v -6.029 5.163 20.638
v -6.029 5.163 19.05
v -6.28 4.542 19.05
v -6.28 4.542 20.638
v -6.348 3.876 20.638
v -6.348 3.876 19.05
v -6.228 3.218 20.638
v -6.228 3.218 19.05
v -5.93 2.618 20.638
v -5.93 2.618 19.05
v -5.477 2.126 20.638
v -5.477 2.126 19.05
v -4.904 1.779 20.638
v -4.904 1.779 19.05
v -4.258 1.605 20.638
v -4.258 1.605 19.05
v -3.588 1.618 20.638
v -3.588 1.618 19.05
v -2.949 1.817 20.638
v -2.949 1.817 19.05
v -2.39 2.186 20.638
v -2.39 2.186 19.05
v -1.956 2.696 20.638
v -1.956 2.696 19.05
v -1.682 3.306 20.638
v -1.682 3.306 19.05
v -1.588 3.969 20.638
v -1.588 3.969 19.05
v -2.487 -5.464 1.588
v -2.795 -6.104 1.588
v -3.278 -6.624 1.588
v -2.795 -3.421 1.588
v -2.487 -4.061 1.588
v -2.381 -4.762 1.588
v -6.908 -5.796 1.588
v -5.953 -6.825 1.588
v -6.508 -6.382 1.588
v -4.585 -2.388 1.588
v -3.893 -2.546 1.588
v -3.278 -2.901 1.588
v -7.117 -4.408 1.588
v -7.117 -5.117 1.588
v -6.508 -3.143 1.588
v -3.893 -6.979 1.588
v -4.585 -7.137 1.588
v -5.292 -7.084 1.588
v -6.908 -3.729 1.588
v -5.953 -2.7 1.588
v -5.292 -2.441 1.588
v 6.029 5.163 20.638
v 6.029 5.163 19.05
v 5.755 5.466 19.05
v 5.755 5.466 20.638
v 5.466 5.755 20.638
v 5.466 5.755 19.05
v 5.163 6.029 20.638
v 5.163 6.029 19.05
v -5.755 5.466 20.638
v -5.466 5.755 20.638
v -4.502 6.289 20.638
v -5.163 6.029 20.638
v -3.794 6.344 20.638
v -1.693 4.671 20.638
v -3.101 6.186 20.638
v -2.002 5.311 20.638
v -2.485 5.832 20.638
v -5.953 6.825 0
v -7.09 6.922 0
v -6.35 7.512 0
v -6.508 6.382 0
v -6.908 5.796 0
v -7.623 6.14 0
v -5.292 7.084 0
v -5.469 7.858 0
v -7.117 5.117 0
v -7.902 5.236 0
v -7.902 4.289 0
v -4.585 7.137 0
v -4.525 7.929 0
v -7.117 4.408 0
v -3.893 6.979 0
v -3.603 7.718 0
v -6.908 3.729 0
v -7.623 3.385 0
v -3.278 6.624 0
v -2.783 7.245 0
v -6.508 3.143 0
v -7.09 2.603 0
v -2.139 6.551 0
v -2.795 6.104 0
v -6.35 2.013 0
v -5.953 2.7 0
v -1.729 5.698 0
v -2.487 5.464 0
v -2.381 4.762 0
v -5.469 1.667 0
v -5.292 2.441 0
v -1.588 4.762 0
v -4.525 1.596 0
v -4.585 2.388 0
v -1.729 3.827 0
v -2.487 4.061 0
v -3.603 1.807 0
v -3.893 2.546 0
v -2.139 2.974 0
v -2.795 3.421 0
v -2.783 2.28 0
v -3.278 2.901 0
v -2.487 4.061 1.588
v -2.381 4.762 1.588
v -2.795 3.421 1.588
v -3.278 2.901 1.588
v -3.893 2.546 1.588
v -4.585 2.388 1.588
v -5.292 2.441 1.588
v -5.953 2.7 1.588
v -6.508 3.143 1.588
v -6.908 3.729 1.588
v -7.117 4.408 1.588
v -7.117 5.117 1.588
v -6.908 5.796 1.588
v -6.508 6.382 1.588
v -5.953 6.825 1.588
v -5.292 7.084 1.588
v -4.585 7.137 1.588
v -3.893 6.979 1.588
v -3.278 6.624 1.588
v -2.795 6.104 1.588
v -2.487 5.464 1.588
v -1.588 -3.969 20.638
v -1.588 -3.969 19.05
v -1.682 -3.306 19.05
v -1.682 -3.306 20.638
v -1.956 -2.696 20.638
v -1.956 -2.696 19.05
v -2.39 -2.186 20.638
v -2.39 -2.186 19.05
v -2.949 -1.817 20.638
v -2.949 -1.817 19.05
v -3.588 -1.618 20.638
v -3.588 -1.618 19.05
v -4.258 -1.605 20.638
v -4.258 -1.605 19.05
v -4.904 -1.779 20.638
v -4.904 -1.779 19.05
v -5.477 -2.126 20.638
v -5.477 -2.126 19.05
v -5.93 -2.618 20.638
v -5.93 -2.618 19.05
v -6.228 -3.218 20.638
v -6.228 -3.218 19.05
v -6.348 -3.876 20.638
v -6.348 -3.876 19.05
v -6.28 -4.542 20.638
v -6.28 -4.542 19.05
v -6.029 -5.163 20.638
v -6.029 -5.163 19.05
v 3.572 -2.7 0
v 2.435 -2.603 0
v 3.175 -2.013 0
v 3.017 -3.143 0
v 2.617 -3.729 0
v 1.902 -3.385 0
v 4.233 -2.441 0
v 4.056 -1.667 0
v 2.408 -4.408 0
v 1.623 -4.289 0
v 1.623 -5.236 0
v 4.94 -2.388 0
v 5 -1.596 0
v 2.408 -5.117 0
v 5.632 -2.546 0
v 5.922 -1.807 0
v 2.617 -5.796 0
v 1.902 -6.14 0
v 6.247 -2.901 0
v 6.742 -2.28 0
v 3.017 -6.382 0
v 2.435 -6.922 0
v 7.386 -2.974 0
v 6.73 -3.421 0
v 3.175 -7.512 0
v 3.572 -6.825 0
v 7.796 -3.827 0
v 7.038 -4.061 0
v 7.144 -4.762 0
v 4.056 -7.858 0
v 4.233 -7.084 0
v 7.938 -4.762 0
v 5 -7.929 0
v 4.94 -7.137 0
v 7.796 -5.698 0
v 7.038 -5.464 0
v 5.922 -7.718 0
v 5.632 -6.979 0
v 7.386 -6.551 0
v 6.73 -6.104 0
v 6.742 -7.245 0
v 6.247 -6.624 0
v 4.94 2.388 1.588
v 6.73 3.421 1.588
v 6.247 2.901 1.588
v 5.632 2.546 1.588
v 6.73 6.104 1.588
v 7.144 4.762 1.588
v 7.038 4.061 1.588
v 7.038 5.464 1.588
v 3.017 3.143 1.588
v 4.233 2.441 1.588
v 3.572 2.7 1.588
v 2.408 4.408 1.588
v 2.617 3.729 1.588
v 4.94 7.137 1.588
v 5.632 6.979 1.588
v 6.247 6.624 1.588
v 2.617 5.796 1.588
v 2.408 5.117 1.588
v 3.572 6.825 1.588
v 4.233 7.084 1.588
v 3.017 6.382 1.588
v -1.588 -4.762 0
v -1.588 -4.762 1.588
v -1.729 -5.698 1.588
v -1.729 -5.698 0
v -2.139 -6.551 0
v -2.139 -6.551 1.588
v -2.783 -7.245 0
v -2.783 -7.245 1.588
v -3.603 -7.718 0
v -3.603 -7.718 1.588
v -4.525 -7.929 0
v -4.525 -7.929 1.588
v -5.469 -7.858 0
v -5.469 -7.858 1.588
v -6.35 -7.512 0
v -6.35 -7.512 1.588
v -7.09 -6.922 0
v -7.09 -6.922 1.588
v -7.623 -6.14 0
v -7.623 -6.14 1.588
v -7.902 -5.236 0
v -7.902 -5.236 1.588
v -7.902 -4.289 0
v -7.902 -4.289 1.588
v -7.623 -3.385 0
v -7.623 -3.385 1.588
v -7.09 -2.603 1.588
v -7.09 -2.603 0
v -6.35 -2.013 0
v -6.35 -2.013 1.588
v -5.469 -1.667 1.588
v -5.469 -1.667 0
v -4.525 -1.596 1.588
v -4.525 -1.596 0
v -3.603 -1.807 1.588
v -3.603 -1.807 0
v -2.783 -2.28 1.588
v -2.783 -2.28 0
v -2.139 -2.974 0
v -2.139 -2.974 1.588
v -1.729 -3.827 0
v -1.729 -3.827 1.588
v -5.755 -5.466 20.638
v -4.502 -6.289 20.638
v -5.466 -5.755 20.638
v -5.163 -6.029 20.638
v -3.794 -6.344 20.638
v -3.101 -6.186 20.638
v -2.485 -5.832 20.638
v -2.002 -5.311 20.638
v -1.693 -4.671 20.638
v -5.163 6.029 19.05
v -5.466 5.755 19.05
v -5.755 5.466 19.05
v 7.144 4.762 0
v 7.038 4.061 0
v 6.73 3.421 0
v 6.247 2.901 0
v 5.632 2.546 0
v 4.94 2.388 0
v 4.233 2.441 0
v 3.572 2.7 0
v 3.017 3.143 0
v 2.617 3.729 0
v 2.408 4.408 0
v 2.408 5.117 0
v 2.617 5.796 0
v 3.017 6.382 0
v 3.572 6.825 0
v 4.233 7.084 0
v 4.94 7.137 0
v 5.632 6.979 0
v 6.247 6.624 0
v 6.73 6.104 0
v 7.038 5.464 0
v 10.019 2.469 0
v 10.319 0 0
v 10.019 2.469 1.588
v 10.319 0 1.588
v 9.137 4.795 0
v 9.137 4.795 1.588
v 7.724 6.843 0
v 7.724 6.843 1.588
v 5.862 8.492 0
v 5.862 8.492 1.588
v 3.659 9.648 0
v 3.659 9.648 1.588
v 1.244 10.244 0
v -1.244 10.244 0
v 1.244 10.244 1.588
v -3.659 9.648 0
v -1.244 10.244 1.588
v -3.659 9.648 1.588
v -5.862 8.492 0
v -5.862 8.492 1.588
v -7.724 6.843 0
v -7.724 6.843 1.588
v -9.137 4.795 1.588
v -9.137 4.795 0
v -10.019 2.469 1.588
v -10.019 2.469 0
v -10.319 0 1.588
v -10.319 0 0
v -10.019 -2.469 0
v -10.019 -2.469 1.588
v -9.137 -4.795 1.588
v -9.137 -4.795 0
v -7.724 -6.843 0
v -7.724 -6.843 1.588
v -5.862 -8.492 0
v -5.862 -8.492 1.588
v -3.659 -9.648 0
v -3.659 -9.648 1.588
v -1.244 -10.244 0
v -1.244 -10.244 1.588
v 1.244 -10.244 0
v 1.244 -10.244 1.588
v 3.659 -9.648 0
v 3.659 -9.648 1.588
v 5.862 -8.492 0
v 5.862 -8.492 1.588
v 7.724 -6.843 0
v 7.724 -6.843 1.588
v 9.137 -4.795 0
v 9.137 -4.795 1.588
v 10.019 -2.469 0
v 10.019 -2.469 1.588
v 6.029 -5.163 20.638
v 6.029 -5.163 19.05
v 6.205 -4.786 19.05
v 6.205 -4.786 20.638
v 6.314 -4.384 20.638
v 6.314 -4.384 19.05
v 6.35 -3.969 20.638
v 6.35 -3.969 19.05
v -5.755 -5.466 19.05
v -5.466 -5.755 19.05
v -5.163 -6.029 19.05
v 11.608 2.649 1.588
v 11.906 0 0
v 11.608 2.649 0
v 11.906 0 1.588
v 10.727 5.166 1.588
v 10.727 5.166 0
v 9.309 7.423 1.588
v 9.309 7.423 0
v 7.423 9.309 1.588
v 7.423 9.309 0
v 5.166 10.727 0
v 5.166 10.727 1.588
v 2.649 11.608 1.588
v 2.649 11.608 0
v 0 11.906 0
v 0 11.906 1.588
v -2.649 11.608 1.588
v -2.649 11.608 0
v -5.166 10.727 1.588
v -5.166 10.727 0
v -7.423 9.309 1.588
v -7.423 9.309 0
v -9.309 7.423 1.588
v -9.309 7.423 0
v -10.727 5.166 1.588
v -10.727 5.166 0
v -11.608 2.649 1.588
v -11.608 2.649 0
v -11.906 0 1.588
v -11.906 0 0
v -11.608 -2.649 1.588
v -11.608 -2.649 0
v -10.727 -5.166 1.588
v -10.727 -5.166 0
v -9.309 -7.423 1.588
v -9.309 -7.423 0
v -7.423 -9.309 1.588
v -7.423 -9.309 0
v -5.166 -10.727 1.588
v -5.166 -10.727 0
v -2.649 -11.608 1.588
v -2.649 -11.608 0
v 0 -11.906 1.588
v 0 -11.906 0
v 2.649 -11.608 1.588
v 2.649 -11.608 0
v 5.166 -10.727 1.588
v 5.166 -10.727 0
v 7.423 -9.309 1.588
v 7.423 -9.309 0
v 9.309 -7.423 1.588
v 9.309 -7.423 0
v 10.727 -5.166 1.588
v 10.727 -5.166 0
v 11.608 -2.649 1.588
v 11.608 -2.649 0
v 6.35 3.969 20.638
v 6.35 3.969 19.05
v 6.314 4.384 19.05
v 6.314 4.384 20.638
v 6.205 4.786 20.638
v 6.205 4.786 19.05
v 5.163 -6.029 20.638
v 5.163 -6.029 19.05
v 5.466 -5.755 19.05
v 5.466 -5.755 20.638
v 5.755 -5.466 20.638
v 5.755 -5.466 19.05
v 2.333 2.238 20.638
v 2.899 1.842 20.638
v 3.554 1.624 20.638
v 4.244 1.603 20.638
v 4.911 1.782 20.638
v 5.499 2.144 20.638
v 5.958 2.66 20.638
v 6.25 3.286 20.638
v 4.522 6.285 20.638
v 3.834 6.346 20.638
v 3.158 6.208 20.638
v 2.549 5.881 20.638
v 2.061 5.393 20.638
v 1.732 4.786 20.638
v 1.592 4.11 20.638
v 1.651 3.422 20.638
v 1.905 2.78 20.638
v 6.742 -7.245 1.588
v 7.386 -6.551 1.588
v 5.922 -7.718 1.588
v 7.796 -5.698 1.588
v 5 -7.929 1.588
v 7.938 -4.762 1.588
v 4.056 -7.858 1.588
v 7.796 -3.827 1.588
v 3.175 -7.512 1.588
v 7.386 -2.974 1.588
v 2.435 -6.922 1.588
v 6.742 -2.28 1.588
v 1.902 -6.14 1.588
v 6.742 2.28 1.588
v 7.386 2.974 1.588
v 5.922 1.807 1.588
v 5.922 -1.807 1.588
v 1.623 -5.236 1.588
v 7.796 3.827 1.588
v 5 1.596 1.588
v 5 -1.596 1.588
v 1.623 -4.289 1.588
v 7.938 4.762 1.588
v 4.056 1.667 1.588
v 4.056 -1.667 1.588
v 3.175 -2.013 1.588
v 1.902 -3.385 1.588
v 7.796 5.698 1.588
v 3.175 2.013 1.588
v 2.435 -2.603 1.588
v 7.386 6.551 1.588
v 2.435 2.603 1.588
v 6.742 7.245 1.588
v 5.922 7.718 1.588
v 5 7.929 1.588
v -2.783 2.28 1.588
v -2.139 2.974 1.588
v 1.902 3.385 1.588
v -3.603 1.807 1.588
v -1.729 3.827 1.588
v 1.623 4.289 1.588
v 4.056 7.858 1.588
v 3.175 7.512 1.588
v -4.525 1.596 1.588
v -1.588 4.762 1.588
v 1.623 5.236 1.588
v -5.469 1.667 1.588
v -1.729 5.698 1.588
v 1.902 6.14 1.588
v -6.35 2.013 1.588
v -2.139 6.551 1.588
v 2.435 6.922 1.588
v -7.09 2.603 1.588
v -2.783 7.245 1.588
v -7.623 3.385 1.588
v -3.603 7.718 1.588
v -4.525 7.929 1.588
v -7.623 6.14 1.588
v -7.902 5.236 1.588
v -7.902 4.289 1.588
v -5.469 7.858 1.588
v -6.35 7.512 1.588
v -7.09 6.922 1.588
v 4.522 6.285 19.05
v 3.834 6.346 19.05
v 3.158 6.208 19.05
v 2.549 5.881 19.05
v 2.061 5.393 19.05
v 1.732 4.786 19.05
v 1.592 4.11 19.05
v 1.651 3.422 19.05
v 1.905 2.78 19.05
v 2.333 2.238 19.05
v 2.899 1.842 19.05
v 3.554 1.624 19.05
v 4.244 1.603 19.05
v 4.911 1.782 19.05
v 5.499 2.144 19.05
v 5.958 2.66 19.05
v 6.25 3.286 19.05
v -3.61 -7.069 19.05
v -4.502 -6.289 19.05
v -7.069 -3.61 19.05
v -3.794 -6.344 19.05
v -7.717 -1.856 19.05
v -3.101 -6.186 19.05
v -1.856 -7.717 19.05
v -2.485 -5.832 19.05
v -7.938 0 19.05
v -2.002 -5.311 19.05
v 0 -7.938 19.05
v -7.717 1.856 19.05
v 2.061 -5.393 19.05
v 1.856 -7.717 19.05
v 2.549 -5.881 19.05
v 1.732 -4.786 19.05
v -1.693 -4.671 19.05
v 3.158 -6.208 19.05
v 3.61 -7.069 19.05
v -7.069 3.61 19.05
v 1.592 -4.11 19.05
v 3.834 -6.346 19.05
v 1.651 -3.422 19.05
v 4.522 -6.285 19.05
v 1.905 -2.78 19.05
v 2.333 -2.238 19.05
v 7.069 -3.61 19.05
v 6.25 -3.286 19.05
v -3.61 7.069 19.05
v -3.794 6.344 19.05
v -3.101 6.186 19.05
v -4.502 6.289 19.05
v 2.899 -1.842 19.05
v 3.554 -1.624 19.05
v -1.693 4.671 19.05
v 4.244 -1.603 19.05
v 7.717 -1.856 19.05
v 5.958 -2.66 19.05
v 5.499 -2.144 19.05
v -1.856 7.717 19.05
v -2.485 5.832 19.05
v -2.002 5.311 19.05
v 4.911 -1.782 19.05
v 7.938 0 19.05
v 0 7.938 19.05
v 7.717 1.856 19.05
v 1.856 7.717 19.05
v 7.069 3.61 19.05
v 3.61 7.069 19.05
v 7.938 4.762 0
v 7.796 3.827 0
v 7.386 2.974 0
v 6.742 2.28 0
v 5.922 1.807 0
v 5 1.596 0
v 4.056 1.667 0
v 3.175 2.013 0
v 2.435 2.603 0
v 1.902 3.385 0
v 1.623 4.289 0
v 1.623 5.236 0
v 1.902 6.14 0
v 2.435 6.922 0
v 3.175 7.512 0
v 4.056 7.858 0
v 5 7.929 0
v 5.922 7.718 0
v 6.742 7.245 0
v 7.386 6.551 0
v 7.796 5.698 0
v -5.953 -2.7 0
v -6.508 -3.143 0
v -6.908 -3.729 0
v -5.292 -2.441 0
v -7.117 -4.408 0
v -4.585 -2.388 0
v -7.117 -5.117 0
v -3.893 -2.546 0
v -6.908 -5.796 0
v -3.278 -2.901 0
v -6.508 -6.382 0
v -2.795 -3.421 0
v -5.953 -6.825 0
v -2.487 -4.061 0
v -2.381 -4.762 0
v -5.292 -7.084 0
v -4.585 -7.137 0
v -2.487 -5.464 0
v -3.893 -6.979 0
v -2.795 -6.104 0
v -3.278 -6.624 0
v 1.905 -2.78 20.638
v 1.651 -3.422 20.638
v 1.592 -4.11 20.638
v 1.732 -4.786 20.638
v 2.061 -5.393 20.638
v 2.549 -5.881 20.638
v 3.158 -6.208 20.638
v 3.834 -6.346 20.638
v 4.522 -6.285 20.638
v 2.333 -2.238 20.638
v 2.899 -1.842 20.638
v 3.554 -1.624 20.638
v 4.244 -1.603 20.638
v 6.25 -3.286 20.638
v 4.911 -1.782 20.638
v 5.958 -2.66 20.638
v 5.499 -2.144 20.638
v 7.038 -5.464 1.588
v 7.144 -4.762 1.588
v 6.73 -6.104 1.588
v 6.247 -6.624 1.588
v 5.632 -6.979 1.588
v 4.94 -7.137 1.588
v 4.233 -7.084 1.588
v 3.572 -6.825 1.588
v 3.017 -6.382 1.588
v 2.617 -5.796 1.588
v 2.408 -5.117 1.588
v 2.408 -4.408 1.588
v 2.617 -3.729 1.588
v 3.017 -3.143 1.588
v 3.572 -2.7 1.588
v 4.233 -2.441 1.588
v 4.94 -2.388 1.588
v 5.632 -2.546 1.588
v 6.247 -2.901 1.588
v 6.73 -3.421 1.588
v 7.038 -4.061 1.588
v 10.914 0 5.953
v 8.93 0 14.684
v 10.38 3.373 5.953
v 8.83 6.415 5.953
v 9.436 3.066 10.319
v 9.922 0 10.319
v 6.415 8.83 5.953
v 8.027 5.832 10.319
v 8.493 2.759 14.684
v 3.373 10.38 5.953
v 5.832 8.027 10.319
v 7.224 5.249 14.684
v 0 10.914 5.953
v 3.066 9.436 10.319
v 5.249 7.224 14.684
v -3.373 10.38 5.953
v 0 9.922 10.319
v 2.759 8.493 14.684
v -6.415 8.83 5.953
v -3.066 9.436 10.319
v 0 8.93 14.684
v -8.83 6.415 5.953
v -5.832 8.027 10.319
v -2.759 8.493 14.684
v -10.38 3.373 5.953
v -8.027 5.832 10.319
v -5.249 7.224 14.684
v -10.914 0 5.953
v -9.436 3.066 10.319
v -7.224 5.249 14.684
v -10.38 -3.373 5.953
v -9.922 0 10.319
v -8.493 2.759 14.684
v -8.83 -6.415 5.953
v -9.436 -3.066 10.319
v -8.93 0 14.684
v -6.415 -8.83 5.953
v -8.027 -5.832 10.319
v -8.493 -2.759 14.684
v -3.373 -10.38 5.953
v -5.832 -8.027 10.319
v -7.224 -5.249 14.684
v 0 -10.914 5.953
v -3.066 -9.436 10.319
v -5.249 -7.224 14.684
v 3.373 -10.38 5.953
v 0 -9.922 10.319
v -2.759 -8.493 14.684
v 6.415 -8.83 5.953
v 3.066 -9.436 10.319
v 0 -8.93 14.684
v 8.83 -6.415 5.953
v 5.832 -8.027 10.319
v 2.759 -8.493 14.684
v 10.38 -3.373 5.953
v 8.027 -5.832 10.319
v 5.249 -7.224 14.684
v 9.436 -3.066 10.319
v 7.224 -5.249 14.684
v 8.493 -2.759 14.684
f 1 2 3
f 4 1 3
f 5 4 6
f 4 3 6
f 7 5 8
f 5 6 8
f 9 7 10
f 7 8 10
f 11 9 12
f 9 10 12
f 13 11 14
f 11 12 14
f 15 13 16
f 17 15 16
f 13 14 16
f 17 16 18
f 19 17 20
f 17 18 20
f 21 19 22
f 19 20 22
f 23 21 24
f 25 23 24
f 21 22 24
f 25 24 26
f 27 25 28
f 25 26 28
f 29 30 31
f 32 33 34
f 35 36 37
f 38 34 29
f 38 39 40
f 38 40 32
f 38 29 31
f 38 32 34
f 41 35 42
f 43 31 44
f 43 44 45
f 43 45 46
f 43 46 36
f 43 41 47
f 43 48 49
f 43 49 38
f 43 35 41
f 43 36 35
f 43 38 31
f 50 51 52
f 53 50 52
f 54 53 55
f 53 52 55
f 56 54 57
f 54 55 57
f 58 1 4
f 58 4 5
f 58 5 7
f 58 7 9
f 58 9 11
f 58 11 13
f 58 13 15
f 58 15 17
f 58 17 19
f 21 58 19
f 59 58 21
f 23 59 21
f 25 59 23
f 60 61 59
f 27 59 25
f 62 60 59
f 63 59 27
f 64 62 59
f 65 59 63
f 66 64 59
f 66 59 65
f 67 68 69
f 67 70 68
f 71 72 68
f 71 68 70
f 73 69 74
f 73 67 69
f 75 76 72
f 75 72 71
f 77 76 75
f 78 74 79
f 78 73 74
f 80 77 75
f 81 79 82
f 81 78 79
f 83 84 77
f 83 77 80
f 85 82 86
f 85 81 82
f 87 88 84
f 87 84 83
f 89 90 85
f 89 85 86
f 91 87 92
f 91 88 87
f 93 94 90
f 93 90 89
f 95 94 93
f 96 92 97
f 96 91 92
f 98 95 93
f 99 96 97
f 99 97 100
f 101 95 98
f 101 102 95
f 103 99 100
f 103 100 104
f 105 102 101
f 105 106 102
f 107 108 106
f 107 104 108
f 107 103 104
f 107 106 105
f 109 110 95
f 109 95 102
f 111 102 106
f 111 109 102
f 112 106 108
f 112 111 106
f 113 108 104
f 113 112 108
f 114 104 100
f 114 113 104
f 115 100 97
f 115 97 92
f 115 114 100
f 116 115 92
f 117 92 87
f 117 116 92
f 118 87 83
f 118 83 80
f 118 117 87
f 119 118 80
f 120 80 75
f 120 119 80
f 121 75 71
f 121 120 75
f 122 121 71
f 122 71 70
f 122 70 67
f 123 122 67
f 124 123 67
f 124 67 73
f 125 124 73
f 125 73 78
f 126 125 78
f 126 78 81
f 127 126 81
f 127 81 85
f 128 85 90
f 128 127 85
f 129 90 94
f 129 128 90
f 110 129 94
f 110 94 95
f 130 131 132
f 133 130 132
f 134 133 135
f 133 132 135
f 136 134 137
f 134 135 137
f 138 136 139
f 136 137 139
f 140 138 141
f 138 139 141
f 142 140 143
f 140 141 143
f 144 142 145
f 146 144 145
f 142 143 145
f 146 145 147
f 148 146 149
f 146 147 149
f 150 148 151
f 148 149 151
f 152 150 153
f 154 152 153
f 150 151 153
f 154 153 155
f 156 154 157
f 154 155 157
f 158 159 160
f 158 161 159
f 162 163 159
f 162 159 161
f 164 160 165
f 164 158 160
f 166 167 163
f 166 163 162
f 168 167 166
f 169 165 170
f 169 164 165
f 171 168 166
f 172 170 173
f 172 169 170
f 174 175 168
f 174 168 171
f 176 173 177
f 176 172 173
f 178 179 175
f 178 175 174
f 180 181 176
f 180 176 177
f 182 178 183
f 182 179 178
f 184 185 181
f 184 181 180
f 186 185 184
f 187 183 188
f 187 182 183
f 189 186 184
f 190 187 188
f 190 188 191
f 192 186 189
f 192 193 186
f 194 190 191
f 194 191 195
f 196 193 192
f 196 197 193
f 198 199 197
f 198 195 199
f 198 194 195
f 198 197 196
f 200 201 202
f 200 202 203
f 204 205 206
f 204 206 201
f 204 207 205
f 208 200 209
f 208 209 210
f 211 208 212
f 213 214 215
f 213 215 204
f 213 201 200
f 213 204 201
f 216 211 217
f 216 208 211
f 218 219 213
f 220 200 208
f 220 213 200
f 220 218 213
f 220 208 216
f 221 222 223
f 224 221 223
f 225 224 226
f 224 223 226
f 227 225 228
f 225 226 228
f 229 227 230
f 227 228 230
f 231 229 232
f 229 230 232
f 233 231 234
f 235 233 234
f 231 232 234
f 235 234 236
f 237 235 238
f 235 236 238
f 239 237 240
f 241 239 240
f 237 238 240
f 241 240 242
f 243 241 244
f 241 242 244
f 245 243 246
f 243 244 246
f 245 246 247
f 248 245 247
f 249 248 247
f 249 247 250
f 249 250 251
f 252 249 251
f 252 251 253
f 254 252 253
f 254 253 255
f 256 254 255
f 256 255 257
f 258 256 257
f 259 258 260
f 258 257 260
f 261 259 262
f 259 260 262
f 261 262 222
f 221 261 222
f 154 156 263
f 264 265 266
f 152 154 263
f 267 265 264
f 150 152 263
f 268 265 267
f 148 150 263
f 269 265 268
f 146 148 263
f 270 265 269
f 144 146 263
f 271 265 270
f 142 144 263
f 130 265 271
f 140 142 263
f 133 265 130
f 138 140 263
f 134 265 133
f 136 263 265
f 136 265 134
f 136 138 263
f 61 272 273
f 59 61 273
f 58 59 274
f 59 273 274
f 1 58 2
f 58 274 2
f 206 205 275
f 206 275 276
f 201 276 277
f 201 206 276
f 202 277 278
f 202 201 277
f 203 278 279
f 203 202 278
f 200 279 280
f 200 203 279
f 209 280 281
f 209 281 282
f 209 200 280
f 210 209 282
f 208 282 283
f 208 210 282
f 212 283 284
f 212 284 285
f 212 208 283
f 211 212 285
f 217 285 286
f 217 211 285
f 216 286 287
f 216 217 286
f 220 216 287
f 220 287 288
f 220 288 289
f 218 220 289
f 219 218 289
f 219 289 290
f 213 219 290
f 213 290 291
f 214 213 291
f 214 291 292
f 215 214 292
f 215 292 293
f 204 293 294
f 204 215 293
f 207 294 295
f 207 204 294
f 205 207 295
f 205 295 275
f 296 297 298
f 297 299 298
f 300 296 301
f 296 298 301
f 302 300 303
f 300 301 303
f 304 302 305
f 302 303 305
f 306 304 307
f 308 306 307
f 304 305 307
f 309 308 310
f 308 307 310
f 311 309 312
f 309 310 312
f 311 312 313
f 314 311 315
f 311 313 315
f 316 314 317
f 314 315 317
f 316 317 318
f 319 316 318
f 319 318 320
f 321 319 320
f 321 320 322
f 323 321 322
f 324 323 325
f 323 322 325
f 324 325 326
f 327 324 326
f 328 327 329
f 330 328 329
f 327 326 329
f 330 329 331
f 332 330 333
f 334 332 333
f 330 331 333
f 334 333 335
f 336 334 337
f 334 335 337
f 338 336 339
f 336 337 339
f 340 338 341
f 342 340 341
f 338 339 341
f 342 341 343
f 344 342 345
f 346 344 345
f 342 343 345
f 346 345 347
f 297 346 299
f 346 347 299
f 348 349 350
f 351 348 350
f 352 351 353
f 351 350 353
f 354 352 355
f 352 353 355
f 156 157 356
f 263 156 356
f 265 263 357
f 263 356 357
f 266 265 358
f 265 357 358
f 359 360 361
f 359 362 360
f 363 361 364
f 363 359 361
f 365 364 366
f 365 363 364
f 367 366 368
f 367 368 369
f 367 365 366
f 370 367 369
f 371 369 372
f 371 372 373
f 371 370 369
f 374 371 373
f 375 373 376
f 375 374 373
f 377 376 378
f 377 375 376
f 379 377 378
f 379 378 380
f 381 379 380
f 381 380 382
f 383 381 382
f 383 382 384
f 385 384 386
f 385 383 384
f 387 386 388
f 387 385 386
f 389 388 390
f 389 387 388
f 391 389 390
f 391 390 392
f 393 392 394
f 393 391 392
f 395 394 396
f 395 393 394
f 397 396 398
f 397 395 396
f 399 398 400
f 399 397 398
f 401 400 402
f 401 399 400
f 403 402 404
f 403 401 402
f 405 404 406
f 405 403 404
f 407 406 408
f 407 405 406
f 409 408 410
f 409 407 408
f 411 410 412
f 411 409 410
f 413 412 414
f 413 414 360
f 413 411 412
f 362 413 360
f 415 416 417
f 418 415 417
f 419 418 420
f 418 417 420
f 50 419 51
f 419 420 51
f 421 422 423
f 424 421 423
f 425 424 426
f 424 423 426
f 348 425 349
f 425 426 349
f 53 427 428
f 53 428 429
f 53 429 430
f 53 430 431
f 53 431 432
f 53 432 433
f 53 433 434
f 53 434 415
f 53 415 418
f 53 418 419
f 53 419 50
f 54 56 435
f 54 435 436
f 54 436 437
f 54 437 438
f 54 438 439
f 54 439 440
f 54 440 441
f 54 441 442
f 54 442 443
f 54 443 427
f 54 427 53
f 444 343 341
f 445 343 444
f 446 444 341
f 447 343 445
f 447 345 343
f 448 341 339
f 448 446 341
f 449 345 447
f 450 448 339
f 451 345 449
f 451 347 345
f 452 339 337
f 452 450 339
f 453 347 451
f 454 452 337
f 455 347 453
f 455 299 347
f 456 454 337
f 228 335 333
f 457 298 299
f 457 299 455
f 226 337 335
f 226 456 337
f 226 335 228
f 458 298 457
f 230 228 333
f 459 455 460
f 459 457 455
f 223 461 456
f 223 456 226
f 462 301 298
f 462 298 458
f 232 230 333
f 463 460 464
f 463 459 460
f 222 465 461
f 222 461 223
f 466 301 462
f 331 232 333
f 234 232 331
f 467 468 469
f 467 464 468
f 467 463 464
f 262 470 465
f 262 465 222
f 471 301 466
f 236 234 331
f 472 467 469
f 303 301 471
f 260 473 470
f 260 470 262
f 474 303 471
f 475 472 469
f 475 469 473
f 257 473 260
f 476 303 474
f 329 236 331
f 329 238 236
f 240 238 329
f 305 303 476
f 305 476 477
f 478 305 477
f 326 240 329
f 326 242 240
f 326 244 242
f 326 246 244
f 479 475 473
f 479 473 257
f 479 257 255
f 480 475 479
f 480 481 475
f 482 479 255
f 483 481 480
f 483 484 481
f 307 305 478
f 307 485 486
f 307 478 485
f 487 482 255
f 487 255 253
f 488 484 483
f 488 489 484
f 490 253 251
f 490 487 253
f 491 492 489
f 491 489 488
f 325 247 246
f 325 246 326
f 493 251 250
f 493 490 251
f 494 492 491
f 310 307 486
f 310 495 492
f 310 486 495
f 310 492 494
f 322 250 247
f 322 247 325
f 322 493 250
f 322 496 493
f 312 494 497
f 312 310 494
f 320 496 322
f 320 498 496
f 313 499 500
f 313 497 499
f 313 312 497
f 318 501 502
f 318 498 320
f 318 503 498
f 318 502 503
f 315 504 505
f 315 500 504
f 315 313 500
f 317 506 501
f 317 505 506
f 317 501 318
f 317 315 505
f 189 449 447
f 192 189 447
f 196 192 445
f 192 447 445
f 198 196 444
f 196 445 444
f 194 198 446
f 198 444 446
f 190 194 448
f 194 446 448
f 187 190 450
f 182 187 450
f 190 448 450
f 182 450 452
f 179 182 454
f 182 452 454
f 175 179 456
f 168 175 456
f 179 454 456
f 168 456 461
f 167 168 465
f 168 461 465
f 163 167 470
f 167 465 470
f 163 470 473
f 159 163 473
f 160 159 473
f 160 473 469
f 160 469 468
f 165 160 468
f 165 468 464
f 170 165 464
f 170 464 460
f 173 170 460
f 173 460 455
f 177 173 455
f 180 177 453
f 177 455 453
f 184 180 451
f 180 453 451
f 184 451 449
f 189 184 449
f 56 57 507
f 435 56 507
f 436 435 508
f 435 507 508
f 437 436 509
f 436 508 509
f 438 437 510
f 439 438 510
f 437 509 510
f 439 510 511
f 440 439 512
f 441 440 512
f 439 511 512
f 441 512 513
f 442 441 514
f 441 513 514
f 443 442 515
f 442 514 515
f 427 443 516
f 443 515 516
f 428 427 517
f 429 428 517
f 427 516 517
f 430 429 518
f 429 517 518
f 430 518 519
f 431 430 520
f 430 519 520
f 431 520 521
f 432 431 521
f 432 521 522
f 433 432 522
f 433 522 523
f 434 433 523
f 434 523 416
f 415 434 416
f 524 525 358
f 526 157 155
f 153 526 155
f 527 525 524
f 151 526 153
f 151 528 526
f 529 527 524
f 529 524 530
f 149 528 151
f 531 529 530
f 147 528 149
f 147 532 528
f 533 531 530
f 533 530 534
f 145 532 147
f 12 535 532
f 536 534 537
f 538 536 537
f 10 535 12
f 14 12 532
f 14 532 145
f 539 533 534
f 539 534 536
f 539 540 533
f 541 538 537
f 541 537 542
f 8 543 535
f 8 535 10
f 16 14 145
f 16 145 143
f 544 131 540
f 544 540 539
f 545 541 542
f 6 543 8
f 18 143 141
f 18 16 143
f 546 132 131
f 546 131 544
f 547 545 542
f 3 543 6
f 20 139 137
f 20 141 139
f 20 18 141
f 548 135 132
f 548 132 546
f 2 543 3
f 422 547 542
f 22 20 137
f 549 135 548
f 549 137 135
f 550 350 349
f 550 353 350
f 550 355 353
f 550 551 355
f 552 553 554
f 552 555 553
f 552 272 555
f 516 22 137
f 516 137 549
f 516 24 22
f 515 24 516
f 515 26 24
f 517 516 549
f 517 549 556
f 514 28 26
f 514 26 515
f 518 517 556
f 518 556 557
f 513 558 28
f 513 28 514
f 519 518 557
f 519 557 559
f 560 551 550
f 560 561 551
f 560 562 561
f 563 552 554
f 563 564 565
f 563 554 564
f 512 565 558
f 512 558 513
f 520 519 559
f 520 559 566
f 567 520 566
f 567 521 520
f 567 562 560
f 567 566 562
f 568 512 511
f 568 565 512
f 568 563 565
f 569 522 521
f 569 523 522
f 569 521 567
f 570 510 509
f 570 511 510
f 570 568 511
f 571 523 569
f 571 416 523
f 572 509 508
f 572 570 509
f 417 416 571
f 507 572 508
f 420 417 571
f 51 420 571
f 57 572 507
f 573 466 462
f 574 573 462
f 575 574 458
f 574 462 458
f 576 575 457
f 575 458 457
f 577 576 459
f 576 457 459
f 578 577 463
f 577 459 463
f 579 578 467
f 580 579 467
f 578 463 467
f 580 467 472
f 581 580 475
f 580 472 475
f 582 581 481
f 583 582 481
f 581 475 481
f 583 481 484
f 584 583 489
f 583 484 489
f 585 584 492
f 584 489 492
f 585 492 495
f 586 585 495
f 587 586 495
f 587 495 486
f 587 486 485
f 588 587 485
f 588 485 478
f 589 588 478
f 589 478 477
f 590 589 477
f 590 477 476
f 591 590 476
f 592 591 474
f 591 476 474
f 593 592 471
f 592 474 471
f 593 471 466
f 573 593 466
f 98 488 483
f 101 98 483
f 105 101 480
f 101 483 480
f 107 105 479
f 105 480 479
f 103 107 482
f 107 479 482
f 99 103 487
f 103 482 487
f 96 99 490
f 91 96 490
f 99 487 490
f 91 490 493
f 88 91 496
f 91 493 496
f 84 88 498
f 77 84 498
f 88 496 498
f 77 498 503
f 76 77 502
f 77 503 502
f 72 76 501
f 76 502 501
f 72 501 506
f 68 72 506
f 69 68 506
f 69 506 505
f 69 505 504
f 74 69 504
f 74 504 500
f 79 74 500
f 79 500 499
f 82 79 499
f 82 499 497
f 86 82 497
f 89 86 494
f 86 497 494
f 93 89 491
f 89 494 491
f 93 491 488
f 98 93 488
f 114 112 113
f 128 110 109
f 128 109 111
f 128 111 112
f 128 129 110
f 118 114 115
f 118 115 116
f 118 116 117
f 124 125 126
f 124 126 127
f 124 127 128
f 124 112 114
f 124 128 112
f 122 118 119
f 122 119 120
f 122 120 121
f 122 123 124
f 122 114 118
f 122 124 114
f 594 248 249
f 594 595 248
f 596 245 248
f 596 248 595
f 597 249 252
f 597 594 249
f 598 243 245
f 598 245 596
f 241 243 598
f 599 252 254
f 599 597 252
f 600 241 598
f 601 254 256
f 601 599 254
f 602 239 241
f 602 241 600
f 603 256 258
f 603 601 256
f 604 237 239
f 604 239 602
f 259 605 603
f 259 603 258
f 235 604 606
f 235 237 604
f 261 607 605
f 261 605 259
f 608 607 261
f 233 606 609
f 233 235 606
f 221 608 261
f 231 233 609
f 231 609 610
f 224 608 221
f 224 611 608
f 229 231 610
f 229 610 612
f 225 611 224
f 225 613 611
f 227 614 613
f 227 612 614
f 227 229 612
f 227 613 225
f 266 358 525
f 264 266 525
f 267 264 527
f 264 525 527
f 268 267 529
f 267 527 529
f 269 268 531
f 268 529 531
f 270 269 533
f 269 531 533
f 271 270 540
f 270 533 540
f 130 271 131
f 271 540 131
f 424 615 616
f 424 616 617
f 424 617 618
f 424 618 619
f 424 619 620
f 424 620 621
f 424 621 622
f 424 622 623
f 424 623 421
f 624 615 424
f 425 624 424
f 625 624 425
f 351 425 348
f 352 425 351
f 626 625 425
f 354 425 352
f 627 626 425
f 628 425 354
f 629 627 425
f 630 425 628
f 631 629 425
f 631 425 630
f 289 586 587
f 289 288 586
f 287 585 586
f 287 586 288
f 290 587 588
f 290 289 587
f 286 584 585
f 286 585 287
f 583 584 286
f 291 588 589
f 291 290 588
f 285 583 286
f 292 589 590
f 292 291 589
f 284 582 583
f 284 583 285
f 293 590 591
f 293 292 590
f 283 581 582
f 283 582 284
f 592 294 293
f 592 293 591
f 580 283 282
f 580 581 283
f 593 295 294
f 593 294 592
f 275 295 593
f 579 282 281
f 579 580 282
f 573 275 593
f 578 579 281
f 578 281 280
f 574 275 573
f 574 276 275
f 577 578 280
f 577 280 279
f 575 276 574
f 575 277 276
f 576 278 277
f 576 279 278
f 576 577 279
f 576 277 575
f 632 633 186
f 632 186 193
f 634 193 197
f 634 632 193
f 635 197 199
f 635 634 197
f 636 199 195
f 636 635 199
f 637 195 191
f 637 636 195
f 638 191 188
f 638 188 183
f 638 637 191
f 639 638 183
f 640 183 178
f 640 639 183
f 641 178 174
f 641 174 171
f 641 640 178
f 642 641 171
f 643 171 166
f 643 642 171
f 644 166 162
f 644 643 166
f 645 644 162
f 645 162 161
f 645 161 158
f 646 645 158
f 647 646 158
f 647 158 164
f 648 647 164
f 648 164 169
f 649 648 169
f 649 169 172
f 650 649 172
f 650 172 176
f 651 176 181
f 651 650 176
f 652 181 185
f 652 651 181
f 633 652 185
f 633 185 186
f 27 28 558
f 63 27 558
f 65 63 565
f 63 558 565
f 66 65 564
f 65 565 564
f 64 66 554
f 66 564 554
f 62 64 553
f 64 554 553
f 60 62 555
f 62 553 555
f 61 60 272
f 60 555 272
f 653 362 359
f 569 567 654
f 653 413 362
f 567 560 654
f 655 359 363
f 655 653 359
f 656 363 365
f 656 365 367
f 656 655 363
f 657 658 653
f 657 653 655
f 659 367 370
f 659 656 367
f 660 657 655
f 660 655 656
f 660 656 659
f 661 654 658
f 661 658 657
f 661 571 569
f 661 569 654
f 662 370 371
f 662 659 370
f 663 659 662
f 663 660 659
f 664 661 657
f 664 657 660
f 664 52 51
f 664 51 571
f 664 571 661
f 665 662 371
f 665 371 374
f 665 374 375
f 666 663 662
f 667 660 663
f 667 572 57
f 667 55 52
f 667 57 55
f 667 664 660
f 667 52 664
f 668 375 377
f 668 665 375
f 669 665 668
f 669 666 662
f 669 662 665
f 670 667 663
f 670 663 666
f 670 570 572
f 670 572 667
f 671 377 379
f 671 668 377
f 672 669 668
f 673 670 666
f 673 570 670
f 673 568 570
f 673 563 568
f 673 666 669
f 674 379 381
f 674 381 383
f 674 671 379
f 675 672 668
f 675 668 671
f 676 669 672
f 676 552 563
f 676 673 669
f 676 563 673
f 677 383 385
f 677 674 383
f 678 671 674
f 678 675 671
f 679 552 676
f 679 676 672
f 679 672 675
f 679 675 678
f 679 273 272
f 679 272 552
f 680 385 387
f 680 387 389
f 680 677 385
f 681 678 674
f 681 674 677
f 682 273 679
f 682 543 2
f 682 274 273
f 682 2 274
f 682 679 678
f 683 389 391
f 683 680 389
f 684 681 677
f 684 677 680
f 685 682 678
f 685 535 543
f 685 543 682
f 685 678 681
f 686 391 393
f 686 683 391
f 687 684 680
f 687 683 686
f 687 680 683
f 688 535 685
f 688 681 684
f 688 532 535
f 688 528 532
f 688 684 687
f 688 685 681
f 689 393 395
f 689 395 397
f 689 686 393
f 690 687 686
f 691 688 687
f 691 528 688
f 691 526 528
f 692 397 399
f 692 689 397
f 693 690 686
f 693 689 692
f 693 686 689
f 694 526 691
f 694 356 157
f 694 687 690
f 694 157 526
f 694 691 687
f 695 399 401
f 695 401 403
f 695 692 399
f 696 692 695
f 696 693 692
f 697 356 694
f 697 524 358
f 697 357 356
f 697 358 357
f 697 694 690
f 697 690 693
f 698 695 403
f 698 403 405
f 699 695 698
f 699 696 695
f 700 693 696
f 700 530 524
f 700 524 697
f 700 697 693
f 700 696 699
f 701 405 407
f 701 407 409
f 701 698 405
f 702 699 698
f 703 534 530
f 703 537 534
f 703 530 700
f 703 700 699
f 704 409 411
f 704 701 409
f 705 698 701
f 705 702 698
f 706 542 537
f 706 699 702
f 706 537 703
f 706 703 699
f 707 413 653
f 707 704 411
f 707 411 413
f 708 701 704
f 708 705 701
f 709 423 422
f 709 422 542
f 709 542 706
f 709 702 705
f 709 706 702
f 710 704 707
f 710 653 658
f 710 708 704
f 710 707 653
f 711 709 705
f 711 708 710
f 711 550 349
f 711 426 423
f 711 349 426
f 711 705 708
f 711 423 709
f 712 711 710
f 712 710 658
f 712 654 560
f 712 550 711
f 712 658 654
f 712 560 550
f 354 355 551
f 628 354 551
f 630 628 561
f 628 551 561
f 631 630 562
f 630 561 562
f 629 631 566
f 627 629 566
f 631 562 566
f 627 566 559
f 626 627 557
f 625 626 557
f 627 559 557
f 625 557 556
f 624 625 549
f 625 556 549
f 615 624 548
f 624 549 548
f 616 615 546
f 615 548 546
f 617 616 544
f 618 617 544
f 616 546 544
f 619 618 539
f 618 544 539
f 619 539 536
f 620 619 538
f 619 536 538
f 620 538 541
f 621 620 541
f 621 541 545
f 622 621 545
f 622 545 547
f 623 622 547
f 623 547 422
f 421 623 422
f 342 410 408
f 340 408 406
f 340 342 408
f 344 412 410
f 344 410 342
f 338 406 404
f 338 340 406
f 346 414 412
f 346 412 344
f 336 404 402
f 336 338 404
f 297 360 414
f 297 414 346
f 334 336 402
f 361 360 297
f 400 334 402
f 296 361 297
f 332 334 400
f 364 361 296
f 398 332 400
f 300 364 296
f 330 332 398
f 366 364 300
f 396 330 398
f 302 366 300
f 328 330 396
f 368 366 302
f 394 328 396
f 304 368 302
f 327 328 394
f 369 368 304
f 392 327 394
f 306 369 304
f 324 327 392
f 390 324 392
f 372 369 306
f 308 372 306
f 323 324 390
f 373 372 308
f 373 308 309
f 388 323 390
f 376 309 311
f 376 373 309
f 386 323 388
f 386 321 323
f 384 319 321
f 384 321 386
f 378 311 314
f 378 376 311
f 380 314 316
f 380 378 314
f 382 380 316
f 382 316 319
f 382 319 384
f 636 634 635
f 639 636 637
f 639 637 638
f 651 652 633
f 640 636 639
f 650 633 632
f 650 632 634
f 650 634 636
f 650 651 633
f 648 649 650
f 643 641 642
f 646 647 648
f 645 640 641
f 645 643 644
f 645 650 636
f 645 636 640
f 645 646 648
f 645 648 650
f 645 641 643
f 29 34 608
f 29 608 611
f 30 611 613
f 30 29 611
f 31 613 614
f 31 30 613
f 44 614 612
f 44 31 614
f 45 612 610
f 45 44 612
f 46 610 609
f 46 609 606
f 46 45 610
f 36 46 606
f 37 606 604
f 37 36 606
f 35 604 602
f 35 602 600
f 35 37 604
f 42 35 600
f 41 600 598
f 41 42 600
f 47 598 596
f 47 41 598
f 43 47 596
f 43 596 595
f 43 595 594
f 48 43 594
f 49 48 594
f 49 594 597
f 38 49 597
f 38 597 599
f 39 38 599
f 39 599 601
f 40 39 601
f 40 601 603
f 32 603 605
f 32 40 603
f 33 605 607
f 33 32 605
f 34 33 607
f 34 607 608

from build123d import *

# Parameters (mm, degrees)
F0_W     = 1.5875
F0_H     = 1.5875
F3_DEPTH = 1.5875
F4_R     = 3.175
F4_R_2   = 2.38125
F5_DEPTH = 1.5875


with BuildPart() as f1:
    # F0 (on Front) → F1 (revolve)
    with BuildSketch(Plane.XZ):
        with Locations((11.1125, 0.79375)):
            Rectangle(F0_W, F0_H)
        Polygon((0, 19.05), (0, 1.5875), (10.31875, 1.5875), (11.90625, 1.5875), (7.9375, 19.05), align=None)
    revolve(axis=Axis((0, 0, 9.525), (0, 0, 1)))

    # F2 (on face) → F3 (join)
    with BuildSketch(Plane.XY.offset(19.05)):
        with BuildLine():
            ThreePointArc((6.028877012, 5.162997988), (5.6126600757, 5.6126600757), (5.162997988, 6.028877012))
            ThreePointArc((5.162997988, 6.028877012), (1.9054814058, 2.7799378741), (6.35, 3.96875))
            ThreePointArc((6.35, 3.96875), (6.2683183301, 4.5870840986), (6.028877012, 5.162997988))
        make_face()
        with BuildLine():
            ThreePointArc((-1.5875, 3.96875), (-2.7799378741, 6.0320185942), (-5.162997988, 6.028877012))
            ThreePointArc((-5.162997988, 6.028877012), (-5.6126600757, 5.6126600757), (-6.028877012, 5.162997988))
            ThreePointArc((-6.028877012, 5.162997988), (-4.5870840986, 1.6691816699), (-1.5875, 3.96875))
        make_face()
        with BuildLine():
            ThreePointArc((-6.028877012, -5.162997988), (-5.6126600757, -5.6126600757), (-5.162997988, -6.028877012))
            ThreePointArc((-5.162997988, -6.028877012), (-2.7799378741, -6.0320185942), (-1.5875, -3.96875))
            ThreePointArc((-1.5875, -3.96875), (-4.5870840986, -1.6691816699), (-6.028877012, -5.162997988))
        make_face()
        with BuildLine():
            ThreePointArc((6.35, -3.96875), (1.9054814058, -2.7799378741), (5.162997988, -6.028877012))
            ThreePointArc((5.162997988, -6.028877012), (5.6126600757, -5.6126600757), (6.028877012, -5.162997988))
            ThreePointArc((6.028877012, -5.162997988), (6.2683183301, -4.5870840986), (6.35, -3.96875))
        make_face()
    extrude(amount=F3_DEPTH)

    # F4 (on face) → F5 (join)
    with BuildSketch(Plane(origin=(0, 0, 1.5875), x_dir=(1, 0, 0), z_dir=(0, 0, -1))):
        with Locations((-4.7625, -4.7625)):
            Circle(F4_R)
        with Locations((-4.7625, -4.7625)):
            Circle(F4_R_2, mode=Mode.SUBTRACT)
        with Locations((-4.7625, 4.7625)):
            Circle(F4_R)
        with Locations((-4.7625, 4.7625)):
            Circle(F4_R_2, mode=Mode.SUBTRACT)
        with Locations((4.7625, -4.7625)):
            Circle(F4_R)
        with Locations((4.7625, -4.7625)):
            Circle(F4_R_2, mode=Mode.SUBTRACT)
        with Locations((4.7625, 4.7625)):
            Circle(F4_R)
        with Locations((4.7625, 4.7625)):
            Circle(F4_R_2, mode=Mode.SUBTRACT)
    extrude(amount=F5_DEPTH)


solid = f1.part
